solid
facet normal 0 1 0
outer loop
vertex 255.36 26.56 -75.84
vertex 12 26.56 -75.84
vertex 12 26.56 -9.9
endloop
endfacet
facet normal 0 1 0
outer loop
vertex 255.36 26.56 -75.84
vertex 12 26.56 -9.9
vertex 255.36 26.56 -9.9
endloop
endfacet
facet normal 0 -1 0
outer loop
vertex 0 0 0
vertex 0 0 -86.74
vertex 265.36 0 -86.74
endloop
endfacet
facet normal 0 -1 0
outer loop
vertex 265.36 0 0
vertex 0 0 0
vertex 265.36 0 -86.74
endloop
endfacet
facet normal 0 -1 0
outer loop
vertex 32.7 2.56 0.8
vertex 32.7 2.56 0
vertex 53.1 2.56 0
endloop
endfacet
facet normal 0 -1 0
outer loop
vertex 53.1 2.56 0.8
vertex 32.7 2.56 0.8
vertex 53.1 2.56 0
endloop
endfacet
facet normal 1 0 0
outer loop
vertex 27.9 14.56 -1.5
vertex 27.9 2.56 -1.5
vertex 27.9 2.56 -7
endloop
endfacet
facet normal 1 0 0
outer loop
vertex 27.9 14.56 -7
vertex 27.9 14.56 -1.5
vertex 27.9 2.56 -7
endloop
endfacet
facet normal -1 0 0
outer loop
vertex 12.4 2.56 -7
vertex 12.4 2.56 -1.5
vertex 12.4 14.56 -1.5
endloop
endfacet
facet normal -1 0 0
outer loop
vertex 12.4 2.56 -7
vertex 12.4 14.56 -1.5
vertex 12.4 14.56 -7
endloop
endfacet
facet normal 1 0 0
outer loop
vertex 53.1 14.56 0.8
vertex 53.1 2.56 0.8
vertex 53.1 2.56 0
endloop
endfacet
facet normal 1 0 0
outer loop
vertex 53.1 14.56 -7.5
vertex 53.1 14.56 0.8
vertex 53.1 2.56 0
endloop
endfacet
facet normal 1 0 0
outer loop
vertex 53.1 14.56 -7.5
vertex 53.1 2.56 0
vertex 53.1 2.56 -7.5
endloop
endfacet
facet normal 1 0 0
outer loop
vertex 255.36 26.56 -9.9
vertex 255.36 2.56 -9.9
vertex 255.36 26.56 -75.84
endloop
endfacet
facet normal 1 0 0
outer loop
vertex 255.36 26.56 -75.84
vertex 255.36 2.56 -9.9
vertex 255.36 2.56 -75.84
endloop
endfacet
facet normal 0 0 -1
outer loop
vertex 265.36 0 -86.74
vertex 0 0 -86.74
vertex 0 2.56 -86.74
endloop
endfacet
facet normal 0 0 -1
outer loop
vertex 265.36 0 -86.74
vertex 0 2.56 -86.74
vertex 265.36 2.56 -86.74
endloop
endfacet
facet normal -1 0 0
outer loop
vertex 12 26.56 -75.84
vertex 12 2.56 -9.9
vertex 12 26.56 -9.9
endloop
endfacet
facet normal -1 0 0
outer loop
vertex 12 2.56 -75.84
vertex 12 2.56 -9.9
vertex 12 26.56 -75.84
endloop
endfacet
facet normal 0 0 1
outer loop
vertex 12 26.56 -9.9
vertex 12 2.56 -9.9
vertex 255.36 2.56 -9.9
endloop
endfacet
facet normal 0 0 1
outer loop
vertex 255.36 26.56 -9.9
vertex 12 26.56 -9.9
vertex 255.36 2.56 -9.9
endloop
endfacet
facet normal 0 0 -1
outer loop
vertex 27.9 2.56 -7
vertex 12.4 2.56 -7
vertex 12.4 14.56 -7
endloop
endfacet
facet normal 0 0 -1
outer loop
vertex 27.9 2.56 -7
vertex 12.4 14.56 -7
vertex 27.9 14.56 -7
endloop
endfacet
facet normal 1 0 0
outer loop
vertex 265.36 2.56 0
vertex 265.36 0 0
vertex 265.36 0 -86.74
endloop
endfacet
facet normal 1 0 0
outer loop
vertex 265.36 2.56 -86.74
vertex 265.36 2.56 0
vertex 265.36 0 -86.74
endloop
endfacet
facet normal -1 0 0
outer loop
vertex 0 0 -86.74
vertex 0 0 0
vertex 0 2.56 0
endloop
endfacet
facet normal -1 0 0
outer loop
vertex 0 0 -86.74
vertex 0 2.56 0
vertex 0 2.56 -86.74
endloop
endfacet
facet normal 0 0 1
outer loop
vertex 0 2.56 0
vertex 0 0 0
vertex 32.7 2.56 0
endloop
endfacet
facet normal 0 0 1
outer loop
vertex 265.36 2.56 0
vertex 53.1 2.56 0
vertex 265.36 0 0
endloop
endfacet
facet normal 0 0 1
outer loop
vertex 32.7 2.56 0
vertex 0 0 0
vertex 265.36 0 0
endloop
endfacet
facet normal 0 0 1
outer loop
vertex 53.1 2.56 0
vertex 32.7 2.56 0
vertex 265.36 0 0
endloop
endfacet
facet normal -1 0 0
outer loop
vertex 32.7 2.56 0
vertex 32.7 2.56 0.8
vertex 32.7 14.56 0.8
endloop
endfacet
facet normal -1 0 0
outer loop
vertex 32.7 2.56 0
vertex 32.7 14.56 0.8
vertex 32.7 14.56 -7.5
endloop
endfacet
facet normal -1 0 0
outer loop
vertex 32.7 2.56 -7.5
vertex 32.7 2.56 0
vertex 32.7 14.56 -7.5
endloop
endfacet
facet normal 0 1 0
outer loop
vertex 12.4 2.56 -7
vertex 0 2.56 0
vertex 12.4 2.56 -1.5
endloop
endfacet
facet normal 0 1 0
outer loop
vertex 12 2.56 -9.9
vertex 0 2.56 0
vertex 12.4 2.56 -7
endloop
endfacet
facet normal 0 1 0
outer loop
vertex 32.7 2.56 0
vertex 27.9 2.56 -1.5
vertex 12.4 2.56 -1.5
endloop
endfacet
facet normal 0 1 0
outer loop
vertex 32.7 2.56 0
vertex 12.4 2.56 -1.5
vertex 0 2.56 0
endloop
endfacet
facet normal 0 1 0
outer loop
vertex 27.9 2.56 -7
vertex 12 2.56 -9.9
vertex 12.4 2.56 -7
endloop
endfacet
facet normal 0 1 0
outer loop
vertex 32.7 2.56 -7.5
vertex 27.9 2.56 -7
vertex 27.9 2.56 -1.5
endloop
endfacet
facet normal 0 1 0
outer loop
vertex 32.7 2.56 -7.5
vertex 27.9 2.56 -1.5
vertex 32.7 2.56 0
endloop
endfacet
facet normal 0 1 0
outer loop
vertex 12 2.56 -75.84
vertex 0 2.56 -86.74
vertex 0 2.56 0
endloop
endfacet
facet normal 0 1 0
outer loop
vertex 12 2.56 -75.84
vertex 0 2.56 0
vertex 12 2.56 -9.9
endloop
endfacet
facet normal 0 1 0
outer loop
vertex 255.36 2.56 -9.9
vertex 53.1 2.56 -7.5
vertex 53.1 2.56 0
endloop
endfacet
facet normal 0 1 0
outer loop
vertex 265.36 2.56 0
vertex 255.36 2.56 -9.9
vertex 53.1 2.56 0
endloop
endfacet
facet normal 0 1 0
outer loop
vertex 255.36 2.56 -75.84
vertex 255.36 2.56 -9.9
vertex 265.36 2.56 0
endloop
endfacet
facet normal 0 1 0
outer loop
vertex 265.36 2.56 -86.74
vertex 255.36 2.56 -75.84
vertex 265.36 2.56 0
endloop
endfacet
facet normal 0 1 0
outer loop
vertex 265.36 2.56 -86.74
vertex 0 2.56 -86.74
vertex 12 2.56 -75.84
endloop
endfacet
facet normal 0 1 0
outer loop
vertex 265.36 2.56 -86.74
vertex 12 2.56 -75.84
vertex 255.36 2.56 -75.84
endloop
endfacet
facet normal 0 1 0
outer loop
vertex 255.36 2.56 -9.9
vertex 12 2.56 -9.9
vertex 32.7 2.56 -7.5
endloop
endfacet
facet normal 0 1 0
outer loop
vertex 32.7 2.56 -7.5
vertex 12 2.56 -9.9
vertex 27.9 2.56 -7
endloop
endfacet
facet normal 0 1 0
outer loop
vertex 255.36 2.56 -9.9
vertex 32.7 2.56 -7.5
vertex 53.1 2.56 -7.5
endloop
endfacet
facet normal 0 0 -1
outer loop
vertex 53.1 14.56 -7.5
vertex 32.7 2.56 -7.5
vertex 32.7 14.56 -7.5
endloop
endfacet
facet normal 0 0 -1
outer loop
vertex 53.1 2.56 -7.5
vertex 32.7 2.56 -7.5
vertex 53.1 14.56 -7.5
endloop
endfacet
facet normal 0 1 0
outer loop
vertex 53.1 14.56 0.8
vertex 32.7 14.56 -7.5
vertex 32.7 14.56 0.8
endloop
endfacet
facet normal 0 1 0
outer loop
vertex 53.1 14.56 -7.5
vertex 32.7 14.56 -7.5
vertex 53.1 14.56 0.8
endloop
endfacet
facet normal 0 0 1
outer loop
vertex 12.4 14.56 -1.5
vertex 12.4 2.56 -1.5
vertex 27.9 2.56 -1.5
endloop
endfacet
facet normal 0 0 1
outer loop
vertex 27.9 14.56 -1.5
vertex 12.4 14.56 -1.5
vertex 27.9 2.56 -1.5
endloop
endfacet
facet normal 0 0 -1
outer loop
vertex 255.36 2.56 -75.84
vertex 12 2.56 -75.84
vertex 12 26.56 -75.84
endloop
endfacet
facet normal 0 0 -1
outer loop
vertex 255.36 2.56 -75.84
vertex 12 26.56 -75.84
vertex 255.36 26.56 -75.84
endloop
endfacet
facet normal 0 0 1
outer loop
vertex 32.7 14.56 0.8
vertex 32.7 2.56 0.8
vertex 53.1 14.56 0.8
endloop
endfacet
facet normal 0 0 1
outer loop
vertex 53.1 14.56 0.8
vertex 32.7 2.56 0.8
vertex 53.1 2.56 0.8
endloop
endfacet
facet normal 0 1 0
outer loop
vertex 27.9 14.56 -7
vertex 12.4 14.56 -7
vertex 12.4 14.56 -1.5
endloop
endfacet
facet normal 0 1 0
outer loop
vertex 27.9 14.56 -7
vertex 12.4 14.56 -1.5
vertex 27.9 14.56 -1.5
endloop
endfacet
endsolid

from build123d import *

# Parameters (mm, degrees)
SKETCH1_W           = 265.36
SKETCH1_H           = 86.74
BOSS_EXTRUDE1_DEPTH = 2.56
SKETCH2_W           = 243.36
SKETCH2_H           = 65.94
BOSS_EXTRUDE2_DEPTH = 24
SKETCH3_W           = 15.5
SKETCH3_H           = 5.5
SKETCH3_W_2         = 20.4
SKETCH3_H_2         = 8.3
BOSS_EXTRUDE3_DEPTH = 12


with BuildPart() as part:
    # Sketch1 → Boss-Extrude1 (new body)
    with BuildSketch(Plane(origin=(0, 0, 0), x_dir=(1, 0, 0), z_dir=(0, 1, 0))):
        with Locations((132.68, 43.37)):
            Rectangle(SKETCH1_W, SKETCH1_H)
    extrude(amount=BOSS_EXTRUDE1_DEPTH)

    # Sketch2 → Boss-Extrude2 (add)
    with BuildSketch(Plane(origin=(0, 2.56, 0), x_dir=(1, 0, 0), z_dir=(0, 1, 0))):
        with Locations((133.68, 42.87)):
            Rectangle(SKETCH2_W, SKETCH2_H)
    extrude(amount=BOSS_EXTRUDE2_DEPTH)

    # Sketch3 → Boss-Extrude3 (add)
    with BuildSketch(Plane(origin=(0, 2.56, 0), x_dir=(1, 0, 0), z_dir=(0, 1, 0))):
        with Locations((20.15, 4.25)):
            Rectangle(SKETCH3_W, SKETCH3_H)
        with Locations((42.9, 3.35)):
            Rectangle(SKETCH3_W_2, SKETCH3_H_2)
    extrude(amount=BOSS_EXTRUDE3_DEPTH)


solid = part.part
